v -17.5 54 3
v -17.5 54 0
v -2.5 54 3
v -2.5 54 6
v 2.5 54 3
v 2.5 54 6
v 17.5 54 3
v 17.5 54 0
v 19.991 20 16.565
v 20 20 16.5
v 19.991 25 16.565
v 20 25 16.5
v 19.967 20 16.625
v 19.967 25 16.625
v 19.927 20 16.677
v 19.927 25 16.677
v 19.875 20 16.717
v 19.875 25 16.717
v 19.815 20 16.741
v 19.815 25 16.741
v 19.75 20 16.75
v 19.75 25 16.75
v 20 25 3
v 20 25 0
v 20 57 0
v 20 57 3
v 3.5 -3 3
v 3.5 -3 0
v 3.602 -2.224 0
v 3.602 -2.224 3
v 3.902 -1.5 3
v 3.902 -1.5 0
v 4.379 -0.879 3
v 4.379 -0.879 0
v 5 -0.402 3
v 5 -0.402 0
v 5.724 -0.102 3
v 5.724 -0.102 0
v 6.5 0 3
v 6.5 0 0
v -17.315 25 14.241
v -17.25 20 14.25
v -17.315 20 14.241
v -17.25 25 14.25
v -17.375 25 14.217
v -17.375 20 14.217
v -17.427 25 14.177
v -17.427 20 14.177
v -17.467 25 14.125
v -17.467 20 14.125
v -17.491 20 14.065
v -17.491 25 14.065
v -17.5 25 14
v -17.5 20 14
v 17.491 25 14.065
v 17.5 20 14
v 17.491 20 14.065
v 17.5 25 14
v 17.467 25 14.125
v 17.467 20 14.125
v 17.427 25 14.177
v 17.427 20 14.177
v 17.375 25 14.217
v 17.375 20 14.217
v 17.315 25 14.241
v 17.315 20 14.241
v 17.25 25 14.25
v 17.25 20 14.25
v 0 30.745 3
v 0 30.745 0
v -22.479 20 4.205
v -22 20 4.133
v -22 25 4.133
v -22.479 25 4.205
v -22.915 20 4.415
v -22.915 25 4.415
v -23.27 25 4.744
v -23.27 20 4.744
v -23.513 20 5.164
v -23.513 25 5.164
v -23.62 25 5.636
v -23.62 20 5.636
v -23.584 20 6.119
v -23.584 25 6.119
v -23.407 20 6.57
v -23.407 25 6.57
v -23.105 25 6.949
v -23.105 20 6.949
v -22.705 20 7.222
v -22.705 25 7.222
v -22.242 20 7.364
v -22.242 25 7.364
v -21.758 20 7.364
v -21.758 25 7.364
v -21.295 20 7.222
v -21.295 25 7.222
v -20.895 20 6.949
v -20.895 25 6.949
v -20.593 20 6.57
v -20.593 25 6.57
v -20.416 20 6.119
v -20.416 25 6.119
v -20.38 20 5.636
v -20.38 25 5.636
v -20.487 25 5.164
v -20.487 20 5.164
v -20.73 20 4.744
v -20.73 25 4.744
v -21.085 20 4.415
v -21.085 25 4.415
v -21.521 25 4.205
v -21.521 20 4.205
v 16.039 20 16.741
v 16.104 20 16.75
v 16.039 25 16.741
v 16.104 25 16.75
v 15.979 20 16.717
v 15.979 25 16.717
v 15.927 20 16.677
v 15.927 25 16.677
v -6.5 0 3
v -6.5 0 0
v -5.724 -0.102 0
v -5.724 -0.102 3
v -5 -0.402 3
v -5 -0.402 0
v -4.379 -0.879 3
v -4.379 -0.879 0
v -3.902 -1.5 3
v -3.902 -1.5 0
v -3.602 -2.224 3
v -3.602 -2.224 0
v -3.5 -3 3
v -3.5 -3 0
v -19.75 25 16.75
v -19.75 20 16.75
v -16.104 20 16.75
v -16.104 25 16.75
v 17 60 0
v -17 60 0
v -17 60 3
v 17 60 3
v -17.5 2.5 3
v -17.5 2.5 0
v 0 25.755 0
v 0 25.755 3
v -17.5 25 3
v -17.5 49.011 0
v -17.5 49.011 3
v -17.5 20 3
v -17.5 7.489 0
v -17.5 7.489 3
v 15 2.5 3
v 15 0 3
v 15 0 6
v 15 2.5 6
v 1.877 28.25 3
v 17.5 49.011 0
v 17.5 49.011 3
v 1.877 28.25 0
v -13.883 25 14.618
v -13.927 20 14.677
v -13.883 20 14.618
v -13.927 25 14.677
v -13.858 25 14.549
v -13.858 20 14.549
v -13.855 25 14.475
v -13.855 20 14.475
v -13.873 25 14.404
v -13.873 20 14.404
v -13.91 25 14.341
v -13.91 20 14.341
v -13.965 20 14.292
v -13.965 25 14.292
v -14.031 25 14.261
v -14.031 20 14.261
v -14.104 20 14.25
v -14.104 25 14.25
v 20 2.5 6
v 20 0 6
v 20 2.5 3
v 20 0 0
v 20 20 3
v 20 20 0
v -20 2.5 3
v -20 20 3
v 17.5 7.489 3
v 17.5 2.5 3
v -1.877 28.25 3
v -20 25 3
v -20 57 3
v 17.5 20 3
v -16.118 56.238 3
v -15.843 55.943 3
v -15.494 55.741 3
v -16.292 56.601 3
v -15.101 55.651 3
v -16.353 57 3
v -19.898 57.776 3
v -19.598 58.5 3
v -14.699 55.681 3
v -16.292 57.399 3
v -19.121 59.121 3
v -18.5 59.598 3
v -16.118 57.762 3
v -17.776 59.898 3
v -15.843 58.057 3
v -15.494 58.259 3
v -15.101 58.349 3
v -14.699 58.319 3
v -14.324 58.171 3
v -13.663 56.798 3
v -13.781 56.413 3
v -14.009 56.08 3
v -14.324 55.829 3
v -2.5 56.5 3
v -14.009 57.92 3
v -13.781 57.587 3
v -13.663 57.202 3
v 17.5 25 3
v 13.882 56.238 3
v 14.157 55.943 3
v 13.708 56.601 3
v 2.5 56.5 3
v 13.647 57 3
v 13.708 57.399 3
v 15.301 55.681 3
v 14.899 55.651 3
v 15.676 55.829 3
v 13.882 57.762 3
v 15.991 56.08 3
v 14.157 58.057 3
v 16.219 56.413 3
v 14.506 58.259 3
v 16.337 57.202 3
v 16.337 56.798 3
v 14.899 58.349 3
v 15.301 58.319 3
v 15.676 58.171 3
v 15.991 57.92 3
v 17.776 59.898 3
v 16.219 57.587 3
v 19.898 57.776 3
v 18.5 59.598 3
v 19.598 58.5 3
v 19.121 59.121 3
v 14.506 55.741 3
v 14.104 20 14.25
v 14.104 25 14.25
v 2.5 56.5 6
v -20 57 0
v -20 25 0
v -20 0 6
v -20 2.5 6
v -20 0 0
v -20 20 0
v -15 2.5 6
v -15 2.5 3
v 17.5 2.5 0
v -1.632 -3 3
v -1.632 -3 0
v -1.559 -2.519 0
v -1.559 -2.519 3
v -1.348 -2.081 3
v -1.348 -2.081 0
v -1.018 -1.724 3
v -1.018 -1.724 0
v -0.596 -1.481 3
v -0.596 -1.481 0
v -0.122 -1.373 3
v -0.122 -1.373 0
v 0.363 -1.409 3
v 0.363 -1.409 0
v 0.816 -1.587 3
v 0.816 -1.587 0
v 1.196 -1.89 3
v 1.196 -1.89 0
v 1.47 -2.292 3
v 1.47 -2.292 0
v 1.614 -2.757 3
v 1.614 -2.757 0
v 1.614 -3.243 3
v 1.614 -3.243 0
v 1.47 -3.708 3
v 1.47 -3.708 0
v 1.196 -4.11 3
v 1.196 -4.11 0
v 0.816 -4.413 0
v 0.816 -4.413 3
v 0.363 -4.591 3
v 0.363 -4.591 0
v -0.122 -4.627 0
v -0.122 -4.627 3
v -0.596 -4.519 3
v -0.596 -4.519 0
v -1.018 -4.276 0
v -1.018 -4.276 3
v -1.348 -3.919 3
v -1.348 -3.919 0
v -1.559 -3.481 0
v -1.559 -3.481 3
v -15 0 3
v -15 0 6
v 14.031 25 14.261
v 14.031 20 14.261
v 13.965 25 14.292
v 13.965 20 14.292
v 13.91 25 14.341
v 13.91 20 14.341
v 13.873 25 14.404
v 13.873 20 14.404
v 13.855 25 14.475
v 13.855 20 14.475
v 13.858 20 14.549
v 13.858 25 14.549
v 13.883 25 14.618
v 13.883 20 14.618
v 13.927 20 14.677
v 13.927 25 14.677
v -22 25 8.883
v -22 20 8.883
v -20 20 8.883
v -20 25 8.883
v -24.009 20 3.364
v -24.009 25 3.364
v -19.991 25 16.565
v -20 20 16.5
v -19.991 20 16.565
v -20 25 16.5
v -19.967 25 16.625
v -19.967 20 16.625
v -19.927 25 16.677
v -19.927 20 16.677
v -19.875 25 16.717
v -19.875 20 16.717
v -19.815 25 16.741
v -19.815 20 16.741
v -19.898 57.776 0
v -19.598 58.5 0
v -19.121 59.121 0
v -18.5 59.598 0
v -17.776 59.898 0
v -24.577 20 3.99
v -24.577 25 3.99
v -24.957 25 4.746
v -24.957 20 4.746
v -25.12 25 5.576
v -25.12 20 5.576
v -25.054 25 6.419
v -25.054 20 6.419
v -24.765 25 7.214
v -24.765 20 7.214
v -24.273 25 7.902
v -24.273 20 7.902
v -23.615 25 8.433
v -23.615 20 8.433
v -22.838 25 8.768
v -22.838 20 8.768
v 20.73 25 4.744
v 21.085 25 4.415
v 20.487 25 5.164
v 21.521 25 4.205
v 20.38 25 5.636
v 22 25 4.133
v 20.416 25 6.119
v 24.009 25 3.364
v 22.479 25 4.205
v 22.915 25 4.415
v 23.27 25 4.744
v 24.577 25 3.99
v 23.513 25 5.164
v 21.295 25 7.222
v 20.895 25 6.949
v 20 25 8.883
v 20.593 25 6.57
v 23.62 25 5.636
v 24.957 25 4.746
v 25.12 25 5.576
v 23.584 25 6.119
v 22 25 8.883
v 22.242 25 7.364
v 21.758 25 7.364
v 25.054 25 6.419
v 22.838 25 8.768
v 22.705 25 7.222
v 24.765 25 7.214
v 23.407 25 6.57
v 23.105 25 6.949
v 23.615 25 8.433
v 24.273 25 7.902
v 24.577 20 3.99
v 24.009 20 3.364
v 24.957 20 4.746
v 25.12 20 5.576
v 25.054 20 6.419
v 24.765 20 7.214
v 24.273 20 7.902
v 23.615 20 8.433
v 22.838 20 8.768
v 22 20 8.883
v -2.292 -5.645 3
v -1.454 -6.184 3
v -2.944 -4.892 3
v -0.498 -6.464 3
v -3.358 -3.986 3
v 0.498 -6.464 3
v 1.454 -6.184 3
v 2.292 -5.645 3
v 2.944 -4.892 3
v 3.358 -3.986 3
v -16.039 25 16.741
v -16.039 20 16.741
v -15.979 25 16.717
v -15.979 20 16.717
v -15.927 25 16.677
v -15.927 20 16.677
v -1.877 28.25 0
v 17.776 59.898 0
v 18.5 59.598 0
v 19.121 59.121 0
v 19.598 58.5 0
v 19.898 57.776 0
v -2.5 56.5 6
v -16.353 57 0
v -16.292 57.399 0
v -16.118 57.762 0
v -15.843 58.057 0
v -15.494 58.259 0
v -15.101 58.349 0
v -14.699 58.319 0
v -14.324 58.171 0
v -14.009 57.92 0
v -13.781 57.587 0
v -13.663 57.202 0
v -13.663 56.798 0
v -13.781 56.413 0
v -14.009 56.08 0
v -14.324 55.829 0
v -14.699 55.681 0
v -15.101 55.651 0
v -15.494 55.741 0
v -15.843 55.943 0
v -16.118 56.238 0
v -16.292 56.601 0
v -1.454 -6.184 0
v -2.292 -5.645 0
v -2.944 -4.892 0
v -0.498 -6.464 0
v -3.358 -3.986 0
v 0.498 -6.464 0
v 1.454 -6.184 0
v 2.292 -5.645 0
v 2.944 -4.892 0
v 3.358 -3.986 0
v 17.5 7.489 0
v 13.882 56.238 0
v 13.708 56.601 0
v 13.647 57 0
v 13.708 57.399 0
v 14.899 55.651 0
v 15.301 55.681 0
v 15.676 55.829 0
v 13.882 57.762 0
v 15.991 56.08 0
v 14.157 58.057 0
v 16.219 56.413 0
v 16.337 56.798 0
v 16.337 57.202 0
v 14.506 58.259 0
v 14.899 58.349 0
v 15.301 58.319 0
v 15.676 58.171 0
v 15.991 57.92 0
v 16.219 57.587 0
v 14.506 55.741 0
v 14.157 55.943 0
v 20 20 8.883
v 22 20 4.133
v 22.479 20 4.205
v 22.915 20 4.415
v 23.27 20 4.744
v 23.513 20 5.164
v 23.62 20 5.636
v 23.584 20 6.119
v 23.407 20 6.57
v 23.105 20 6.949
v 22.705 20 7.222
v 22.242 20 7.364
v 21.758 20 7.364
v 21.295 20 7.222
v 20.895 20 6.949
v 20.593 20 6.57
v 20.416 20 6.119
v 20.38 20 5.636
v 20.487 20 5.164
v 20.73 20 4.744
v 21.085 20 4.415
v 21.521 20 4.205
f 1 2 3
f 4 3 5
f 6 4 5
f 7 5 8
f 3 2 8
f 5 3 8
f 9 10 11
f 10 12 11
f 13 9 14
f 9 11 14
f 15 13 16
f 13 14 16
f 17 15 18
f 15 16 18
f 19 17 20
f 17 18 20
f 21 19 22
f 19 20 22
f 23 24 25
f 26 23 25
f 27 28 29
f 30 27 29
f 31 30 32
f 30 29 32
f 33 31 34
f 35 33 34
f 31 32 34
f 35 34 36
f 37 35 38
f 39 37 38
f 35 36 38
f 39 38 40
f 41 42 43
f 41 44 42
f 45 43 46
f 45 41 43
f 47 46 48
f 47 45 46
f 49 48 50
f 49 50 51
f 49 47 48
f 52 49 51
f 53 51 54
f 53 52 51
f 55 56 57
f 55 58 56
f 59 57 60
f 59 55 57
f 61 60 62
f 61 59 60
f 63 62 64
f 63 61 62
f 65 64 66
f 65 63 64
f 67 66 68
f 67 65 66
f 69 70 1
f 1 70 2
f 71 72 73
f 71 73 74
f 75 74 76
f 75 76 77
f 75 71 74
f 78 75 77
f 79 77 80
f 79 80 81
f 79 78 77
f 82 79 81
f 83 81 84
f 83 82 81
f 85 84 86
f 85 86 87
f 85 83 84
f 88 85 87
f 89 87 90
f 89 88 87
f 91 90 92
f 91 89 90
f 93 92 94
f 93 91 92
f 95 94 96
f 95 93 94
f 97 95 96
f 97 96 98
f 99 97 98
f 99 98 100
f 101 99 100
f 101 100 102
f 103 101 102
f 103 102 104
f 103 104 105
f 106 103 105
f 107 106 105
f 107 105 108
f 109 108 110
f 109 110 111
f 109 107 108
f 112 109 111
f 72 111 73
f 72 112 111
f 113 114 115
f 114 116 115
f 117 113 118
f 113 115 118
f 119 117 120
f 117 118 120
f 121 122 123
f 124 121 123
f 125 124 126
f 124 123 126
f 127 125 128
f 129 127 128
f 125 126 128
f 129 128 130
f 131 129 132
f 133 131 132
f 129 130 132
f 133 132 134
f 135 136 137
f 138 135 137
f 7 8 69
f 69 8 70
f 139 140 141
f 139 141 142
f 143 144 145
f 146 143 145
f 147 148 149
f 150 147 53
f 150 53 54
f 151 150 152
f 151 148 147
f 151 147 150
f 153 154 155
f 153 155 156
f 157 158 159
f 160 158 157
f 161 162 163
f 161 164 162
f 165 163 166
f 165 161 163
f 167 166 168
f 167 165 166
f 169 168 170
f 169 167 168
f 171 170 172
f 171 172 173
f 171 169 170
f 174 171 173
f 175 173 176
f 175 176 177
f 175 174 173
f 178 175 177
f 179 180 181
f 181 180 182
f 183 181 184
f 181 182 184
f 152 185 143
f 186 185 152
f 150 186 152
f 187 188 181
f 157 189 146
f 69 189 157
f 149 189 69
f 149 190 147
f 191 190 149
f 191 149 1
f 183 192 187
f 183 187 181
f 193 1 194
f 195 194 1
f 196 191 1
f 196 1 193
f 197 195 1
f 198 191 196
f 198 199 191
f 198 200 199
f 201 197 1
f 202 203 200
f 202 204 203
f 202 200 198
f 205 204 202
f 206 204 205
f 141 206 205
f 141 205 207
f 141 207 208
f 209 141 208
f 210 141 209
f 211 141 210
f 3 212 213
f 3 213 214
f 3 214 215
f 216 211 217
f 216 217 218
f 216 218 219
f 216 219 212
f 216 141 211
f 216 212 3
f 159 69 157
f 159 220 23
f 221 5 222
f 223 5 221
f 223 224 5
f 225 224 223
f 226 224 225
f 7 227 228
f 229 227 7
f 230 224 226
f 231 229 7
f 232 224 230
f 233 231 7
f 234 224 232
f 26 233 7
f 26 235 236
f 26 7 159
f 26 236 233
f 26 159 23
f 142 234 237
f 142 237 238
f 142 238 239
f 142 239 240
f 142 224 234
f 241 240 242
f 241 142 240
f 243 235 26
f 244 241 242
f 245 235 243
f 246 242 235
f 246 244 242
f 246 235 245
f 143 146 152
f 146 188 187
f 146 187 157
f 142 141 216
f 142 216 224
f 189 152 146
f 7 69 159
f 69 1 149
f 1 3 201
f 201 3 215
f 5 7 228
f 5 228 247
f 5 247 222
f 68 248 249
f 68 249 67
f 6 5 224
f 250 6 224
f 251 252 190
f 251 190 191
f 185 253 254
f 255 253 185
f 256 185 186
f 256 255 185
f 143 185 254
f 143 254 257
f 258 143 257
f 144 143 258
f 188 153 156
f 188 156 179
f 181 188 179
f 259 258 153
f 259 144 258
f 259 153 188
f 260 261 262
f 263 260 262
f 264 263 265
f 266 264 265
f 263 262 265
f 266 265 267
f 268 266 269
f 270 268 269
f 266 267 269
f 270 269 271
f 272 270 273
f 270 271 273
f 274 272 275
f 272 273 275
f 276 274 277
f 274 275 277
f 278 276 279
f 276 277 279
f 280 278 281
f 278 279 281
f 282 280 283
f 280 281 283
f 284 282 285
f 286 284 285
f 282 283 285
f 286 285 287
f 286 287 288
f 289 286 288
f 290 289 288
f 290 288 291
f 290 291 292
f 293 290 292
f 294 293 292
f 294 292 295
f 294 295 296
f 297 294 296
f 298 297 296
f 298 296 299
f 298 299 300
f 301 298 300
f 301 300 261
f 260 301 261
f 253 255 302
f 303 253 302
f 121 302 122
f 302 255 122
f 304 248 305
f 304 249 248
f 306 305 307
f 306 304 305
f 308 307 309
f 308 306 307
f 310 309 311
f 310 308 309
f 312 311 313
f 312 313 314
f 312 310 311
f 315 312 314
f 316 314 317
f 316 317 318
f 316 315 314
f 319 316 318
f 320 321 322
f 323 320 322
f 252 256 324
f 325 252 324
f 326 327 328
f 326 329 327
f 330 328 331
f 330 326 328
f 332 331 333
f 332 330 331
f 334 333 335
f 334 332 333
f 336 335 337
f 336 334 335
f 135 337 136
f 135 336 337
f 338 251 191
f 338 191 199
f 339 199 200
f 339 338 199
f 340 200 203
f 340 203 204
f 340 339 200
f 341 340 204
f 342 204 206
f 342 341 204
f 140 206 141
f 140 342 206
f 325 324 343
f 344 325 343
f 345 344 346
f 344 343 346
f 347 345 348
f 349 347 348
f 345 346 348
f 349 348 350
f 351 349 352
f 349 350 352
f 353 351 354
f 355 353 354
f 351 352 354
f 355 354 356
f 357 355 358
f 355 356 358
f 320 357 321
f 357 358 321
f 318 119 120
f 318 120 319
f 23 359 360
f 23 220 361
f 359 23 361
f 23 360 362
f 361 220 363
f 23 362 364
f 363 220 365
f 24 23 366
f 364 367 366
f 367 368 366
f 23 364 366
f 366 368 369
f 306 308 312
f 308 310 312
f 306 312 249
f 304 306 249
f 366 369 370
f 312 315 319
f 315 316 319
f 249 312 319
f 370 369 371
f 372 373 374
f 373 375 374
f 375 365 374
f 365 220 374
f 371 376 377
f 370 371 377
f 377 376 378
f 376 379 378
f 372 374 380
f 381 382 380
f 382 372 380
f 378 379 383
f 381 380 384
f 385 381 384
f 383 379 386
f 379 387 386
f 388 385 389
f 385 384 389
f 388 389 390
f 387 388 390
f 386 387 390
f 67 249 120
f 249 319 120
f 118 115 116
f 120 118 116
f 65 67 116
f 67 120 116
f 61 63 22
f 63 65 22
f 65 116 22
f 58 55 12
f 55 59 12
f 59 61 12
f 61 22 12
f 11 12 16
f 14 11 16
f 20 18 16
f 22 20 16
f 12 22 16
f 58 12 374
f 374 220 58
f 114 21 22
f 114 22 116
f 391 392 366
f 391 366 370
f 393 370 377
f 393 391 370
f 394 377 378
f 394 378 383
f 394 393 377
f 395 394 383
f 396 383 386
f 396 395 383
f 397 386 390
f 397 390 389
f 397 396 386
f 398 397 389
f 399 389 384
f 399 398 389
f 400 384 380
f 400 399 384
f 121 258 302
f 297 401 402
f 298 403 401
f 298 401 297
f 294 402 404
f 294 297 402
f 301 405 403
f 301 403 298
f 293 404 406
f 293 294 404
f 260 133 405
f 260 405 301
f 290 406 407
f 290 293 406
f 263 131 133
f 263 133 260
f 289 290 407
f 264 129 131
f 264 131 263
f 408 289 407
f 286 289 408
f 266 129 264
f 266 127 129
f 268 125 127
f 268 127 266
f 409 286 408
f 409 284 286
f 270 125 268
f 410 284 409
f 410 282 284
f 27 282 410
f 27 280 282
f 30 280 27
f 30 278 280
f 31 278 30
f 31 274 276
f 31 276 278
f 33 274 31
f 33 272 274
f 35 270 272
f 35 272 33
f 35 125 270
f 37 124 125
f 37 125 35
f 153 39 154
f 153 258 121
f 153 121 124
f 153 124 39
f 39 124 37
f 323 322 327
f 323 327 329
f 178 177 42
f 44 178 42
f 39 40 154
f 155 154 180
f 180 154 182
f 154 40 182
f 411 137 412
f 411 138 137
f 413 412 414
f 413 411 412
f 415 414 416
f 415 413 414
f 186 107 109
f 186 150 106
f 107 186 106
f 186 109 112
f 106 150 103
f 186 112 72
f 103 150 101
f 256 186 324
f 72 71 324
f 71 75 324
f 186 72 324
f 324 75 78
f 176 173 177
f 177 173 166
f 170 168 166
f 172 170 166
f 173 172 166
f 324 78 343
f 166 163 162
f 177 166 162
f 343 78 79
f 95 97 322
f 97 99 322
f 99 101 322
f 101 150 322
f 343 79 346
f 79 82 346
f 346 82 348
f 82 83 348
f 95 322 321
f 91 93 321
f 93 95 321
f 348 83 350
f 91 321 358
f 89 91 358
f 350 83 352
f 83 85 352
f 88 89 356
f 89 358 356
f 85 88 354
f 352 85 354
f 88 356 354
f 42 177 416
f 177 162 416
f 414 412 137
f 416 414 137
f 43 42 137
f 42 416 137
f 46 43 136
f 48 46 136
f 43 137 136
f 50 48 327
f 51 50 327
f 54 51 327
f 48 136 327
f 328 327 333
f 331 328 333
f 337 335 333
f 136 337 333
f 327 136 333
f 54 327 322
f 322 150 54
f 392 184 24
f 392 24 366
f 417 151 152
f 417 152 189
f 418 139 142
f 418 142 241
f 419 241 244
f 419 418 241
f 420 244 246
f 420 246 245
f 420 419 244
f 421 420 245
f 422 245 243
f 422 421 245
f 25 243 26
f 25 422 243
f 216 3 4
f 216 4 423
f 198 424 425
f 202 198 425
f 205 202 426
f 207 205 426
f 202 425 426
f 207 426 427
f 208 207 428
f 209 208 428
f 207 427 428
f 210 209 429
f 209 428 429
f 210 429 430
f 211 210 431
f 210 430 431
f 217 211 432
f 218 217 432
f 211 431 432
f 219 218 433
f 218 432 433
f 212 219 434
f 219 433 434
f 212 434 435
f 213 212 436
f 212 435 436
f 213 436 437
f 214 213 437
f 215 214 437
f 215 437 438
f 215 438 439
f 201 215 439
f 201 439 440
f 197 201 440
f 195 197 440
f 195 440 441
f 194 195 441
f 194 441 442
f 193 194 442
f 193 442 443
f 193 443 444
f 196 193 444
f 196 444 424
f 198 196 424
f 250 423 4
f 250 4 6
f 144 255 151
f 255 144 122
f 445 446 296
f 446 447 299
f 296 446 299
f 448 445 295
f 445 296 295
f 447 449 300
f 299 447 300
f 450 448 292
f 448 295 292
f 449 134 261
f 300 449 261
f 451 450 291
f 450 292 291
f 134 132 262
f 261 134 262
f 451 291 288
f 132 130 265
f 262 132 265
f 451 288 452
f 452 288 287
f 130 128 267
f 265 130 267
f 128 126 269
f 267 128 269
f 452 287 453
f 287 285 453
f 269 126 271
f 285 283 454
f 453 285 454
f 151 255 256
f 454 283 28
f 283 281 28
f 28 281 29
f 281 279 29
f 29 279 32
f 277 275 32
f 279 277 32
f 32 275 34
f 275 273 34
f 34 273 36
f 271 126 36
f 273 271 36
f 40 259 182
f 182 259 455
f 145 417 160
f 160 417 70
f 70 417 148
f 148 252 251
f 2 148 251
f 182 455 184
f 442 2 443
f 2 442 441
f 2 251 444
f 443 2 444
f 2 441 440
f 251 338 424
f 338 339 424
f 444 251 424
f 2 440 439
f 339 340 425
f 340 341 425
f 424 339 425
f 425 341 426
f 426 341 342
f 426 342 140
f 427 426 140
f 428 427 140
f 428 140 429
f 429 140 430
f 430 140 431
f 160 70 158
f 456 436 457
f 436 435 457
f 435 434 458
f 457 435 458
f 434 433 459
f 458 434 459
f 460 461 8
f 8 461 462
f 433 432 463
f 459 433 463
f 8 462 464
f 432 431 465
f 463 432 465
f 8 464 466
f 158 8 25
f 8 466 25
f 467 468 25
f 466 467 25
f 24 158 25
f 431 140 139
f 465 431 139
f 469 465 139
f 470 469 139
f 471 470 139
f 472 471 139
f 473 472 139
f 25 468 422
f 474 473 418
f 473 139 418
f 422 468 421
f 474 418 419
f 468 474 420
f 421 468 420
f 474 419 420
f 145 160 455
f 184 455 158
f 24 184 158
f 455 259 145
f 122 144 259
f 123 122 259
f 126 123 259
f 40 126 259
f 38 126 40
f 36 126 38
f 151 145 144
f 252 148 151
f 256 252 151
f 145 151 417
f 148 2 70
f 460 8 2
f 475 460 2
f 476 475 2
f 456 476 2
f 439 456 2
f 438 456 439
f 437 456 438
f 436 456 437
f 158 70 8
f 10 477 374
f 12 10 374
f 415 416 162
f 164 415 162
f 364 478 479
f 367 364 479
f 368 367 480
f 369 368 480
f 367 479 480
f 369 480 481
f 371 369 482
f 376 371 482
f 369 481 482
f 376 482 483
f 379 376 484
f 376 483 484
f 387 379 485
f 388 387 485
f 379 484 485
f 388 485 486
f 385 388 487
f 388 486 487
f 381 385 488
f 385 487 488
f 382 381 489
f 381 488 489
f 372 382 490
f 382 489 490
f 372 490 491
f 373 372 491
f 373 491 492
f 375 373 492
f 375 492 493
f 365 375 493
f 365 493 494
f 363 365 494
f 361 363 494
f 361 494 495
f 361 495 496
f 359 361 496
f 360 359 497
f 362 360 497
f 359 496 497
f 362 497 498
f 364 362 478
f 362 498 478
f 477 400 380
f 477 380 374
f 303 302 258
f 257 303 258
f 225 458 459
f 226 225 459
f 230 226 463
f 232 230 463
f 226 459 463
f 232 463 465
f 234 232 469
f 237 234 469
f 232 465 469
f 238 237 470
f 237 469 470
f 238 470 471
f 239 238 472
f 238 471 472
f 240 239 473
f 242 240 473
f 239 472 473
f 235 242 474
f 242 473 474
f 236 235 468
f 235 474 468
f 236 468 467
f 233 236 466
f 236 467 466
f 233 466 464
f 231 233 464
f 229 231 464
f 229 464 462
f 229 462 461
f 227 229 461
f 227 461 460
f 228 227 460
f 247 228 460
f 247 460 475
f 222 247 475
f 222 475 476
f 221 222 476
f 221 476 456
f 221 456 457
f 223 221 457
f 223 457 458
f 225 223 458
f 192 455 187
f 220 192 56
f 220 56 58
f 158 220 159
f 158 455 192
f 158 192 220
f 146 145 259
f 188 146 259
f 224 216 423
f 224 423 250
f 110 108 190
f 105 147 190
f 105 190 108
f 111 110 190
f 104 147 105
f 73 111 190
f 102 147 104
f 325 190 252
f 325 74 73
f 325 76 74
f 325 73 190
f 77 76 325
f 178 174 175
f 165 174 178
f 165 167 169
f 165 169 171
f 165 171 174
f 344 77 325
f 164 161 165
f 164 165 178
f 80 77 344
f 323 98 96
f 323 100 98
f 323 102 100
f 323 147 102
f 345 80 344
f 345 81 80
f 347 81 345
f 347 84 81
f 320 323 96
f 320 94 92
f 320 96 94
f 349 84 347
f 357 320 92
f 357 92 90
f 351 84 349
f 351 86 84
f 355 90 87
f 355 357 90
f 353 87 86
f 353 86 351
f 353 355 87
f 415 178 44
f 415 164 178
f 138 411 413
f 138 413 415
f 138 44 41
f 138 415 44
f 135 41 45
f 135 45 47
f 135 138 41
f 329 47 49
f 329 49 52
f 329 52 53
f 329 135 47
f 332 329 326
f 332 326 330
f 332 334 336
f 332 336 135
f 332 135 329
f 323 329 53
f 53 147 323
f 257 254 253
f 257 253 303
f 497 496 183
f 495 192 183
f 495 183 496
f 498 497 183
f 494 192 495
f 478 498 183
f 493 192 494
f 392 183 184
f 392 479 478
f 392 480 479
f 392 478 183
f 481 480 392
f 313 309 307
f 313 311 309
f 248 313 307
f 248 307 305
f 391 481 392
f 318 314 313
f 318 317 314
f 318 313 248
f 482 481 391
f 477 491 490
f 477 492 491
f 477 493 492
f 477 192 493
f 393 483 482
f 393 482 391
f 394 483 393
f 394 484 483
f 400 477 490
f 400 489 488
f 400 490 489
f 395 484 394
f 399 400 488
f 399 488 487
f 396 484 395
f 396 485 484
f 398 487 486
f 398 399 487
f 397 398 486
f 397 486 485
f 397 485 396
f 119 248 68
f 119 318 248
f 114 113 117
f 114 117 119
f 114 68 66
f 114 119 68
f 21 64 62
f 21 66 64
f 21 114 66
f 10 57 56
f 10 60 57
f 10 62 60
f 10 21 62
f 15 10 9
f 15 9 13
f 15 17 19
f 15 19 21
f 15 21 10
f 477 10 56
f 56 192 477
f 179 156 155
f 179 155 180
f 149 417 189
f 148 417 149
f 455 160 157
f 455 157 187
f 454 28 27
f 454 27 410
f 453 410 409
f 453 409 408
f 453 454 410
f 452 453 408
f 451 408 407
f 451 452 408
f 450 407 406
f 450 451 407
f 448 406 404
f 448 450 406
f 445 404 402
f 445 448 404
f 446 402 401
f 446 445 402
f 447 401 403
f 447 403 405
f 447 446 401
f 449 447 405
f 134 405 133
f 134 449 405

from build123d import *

# Parameters (mm, degrees)
SKETCH1_W                 = 40
SKETCH1_H                 = 60
BOSS_EXTRUDE1_DEPTH       = 3
F_2_CLEARANCE_HOLE1_D     = 2.7051
F_2_CLEARANCE_HOLE1_DEPTH = 10
F_2_CLEARANCE_HOLE1_TIP   = 0.81269403
BOSS_EXTRUDE2_START       = -20
BOSS_EXTRUDE2_DEPTH       = 5
SKETCH6_R                 = 1.625
BOSS_EXTRUDE4_DEPTH       = 5
FILLET2_R                 = 0.25
SKETCH5_W                 = 5
SKETCH5_H                 = 2.5
BOSS_EXTRUDE3_DEPTH       = 3
BOSS_EXTRUDE5_DEPTH       = 3
F_4_CLEARANCE_HOLE1_D     = 3.2639
FILLET3_START             = -1
FILLET3_DEPTH             = 4
FILLET3_2_DEPTH           = 3


with BuildPart() as part:
    # Sketch1 → Boss-Extrude1 (new body)
    with BuildSketch(Plane.XY):
        with Locations((0, 30)):
            Rectangle(SKETCH1_W, SKETCH1_H)
        Polygon((-17.5, 54), (17.5, 54), (0, 30.744655424), align=None, mode=Mode.SUBTRACT)
        Polygon((-17.5, 49.010689152), (-17.5, 7.489310848), (-1.877266096, 28.25), align=None, mode=Mode.SUBTRACT)
        Polygon((17.5, 49.010689152), (1.877266096, 28.25), (17.5, 7.489310848), align=None, mode=Mode.SUBTRACT)
        Polygon((17.5, 2.5), (-17.5, 2.5), (0, 25.755344576), align=None, mode=Mode.SUBTRACT)
    extrude(amount=BOSS_EXTRUDE1_DEPTH)

    # #2 Clearance Hole1
    with Locations(Plane.XY.offset(3)):
        with Locations((-15, 57), (15, 57)):
            Hole(F_2_CLEARANCE_HOLE1_D / 2, depth=F_2_CLEARANCE_HOLE1_DEPTH)
            with Locations((0, 0, -(F_2_CLEARANCE_HOLE1_DEPTH + F_2_CLEARANCE_HOLE1_TIP / 2))):  # 118° drill point
                Cone(0, F_2_CLEARANCE_HOLE1_D / 2, F_2_CLEARANCE_HOLE1_TIP, mode=Mode.SUBTRACT)

    # Sketch4 → Boss-Extrude2 (add)
    with BuildSketch(Plane.XZ.offset(BOSS_EXTRUDE2_START)):
        Polygon((20, 3), (20, 16.75), (16, 16.75), (13.5, 14.25), (17.5, 14.25), (17.5, 3), align=None)
    boss_extrude2 = extrude(amount=-BOSS_EXTRUDE2_DEPTH)

    # Sketch6 → Boss-Extrude4 (add)
    with BuildSketch(Plane.XZ.offset(-20)):
        with BuildLine():
            Line((20, 8.882597042), (20, 0))
            Line((20, 0), (24.00871128, 3.363708157))
            ThreePointArc((24.00871128, 3.363708157), (24.93653944, 6.826409989), (22, 8.882597042))
            Line((22, 8.882597042), (20, 8.882597042))
        make_face()
        with Locations(Location((22, 5.757597042, 0), (0, 0, 270))):
            Circle(SKETCH6_R, mode=Mode.SUBTRACT)
    boss_extrude4 = extrude(amount=-BOSS_EXTRUDE4_DEPTH)

    # Mirror1: Boss-Extrude2, Boss-Extrude4 across plane
    add(boss_extrude2.mirror(Plane(origin=(0, 0, 0), x_dir=(0, 0, 1), z_dir=(1, 0, 0))))
    add(boss_extrude4.mirror(Plane(origin=(0, 0, 0), x_dir=(0, 0, 1), z_dir=(1, 0, 0))))

    # Fillet2
    fillet2_edges = [part.edges().sort_by_distance(p)[0] for p in [
        (-20, 22.5, 16.75),
        (-16, 22.5, 16.75),
        (-13.5, 22.5, 14.25),
        (-17.5, 22.5, 14.25),
        (17.5, 22.5, 14.25),
        (13.5, 22.5, 14.25),
        (16, 22.5, 16.75),
        (20, 22.5, 16.75),
    ]]
    fillet(fillet2_edges, radius=FILLET2_R)

    # Sketch5 → Boss-Extrude3 (add)
    with BuildSketch(Plane.XY.offset(3)):
        with Locations((17.5, 1.25)):
            Rectangle(SKETCH5_W, SKETCH5_H)
        with Locations((-17.5, 1.25)):
            Rectangle(SKETCH5_W, SKETCH5_H)
        with Locations((0, 55.25)):
            Rectangle(SKETCH5_W, SKETCH5_H)
    extrude(amount=BOSS_EXTRUDE3_DEPTH)

    # Sketch7 → Boss-Extrude5 (add)
    with BuildSketch(Plane(origin=(0, 0, 0), x_dir=(-1, 0, 0), z_dir=(0, 0, -1))):
        with BuildLine():
            Line((3.5, -3), (3.5, 0))
            Line((3.5, 0), (-3.5, 0))
            Line((-3.5, 0), (-3.5, -3))
            ThreePointArc((-3.5, -3), (0, -6.5), (3.5, -3))
        make_face()
    extrude(amount=-BOSS_EXTRUDE5_DEPTH)

    # #4 Clearance Hole1 (through all)
    with Locations(Plane.XY.offset(3)):
        with Locations((0, -3)):
            Hole(F_4_CLEARANCE_HOLE1_D / 2)

    # Fillet3: read off the stored shape, not the designer's step
    # Fillet3 outline → Fillet3 (cut)
    with BuildSketch(Plane.XY.offset(FILLET3_START)):
        with BuildLine():
            Line((-20, 60), (-20, 57))
            ThreePointArc((-20, 57), (-19.121320344, 59.121320344), (-17, 60))
            Line((-17, 60), (-20, 60))
        make_face()
        with BuildLine():
            Line((20, 60), (17, 60))
            ThreePointArc((17, 60), (19.121320344, 59.121320344), (20, 57))
            Line((20, 57), (20, 60))
        make_face()
    extrude(amount=FILLET3_DEPTH, mode=Mode.SUBTRACT)

    # Fillet3 2 outline → Fillet3 2 (add)
    with BuildSketch(Plane.XY):
        with BuildLine():
            Line((-3.5, 0), (-6.5, 0))
            ThreePointArc((-6.5, 0), (-4.378679656, -0.878679656), (-3.5, -3))
            Line((-3.5, -3), (-3.5, 0))
        make_face()
        with BuildLine():
            Line((3.5, 0), (3.5, -3))
            ThreePointArc((3.5, -3), (4.378679656, -0.878679656), (6.5, 0))
            Line((6.5, 0), (3.5, 0))
        make_face()
    extrude(amount=FILLET3_2_DEPTH)


solid = part.part
